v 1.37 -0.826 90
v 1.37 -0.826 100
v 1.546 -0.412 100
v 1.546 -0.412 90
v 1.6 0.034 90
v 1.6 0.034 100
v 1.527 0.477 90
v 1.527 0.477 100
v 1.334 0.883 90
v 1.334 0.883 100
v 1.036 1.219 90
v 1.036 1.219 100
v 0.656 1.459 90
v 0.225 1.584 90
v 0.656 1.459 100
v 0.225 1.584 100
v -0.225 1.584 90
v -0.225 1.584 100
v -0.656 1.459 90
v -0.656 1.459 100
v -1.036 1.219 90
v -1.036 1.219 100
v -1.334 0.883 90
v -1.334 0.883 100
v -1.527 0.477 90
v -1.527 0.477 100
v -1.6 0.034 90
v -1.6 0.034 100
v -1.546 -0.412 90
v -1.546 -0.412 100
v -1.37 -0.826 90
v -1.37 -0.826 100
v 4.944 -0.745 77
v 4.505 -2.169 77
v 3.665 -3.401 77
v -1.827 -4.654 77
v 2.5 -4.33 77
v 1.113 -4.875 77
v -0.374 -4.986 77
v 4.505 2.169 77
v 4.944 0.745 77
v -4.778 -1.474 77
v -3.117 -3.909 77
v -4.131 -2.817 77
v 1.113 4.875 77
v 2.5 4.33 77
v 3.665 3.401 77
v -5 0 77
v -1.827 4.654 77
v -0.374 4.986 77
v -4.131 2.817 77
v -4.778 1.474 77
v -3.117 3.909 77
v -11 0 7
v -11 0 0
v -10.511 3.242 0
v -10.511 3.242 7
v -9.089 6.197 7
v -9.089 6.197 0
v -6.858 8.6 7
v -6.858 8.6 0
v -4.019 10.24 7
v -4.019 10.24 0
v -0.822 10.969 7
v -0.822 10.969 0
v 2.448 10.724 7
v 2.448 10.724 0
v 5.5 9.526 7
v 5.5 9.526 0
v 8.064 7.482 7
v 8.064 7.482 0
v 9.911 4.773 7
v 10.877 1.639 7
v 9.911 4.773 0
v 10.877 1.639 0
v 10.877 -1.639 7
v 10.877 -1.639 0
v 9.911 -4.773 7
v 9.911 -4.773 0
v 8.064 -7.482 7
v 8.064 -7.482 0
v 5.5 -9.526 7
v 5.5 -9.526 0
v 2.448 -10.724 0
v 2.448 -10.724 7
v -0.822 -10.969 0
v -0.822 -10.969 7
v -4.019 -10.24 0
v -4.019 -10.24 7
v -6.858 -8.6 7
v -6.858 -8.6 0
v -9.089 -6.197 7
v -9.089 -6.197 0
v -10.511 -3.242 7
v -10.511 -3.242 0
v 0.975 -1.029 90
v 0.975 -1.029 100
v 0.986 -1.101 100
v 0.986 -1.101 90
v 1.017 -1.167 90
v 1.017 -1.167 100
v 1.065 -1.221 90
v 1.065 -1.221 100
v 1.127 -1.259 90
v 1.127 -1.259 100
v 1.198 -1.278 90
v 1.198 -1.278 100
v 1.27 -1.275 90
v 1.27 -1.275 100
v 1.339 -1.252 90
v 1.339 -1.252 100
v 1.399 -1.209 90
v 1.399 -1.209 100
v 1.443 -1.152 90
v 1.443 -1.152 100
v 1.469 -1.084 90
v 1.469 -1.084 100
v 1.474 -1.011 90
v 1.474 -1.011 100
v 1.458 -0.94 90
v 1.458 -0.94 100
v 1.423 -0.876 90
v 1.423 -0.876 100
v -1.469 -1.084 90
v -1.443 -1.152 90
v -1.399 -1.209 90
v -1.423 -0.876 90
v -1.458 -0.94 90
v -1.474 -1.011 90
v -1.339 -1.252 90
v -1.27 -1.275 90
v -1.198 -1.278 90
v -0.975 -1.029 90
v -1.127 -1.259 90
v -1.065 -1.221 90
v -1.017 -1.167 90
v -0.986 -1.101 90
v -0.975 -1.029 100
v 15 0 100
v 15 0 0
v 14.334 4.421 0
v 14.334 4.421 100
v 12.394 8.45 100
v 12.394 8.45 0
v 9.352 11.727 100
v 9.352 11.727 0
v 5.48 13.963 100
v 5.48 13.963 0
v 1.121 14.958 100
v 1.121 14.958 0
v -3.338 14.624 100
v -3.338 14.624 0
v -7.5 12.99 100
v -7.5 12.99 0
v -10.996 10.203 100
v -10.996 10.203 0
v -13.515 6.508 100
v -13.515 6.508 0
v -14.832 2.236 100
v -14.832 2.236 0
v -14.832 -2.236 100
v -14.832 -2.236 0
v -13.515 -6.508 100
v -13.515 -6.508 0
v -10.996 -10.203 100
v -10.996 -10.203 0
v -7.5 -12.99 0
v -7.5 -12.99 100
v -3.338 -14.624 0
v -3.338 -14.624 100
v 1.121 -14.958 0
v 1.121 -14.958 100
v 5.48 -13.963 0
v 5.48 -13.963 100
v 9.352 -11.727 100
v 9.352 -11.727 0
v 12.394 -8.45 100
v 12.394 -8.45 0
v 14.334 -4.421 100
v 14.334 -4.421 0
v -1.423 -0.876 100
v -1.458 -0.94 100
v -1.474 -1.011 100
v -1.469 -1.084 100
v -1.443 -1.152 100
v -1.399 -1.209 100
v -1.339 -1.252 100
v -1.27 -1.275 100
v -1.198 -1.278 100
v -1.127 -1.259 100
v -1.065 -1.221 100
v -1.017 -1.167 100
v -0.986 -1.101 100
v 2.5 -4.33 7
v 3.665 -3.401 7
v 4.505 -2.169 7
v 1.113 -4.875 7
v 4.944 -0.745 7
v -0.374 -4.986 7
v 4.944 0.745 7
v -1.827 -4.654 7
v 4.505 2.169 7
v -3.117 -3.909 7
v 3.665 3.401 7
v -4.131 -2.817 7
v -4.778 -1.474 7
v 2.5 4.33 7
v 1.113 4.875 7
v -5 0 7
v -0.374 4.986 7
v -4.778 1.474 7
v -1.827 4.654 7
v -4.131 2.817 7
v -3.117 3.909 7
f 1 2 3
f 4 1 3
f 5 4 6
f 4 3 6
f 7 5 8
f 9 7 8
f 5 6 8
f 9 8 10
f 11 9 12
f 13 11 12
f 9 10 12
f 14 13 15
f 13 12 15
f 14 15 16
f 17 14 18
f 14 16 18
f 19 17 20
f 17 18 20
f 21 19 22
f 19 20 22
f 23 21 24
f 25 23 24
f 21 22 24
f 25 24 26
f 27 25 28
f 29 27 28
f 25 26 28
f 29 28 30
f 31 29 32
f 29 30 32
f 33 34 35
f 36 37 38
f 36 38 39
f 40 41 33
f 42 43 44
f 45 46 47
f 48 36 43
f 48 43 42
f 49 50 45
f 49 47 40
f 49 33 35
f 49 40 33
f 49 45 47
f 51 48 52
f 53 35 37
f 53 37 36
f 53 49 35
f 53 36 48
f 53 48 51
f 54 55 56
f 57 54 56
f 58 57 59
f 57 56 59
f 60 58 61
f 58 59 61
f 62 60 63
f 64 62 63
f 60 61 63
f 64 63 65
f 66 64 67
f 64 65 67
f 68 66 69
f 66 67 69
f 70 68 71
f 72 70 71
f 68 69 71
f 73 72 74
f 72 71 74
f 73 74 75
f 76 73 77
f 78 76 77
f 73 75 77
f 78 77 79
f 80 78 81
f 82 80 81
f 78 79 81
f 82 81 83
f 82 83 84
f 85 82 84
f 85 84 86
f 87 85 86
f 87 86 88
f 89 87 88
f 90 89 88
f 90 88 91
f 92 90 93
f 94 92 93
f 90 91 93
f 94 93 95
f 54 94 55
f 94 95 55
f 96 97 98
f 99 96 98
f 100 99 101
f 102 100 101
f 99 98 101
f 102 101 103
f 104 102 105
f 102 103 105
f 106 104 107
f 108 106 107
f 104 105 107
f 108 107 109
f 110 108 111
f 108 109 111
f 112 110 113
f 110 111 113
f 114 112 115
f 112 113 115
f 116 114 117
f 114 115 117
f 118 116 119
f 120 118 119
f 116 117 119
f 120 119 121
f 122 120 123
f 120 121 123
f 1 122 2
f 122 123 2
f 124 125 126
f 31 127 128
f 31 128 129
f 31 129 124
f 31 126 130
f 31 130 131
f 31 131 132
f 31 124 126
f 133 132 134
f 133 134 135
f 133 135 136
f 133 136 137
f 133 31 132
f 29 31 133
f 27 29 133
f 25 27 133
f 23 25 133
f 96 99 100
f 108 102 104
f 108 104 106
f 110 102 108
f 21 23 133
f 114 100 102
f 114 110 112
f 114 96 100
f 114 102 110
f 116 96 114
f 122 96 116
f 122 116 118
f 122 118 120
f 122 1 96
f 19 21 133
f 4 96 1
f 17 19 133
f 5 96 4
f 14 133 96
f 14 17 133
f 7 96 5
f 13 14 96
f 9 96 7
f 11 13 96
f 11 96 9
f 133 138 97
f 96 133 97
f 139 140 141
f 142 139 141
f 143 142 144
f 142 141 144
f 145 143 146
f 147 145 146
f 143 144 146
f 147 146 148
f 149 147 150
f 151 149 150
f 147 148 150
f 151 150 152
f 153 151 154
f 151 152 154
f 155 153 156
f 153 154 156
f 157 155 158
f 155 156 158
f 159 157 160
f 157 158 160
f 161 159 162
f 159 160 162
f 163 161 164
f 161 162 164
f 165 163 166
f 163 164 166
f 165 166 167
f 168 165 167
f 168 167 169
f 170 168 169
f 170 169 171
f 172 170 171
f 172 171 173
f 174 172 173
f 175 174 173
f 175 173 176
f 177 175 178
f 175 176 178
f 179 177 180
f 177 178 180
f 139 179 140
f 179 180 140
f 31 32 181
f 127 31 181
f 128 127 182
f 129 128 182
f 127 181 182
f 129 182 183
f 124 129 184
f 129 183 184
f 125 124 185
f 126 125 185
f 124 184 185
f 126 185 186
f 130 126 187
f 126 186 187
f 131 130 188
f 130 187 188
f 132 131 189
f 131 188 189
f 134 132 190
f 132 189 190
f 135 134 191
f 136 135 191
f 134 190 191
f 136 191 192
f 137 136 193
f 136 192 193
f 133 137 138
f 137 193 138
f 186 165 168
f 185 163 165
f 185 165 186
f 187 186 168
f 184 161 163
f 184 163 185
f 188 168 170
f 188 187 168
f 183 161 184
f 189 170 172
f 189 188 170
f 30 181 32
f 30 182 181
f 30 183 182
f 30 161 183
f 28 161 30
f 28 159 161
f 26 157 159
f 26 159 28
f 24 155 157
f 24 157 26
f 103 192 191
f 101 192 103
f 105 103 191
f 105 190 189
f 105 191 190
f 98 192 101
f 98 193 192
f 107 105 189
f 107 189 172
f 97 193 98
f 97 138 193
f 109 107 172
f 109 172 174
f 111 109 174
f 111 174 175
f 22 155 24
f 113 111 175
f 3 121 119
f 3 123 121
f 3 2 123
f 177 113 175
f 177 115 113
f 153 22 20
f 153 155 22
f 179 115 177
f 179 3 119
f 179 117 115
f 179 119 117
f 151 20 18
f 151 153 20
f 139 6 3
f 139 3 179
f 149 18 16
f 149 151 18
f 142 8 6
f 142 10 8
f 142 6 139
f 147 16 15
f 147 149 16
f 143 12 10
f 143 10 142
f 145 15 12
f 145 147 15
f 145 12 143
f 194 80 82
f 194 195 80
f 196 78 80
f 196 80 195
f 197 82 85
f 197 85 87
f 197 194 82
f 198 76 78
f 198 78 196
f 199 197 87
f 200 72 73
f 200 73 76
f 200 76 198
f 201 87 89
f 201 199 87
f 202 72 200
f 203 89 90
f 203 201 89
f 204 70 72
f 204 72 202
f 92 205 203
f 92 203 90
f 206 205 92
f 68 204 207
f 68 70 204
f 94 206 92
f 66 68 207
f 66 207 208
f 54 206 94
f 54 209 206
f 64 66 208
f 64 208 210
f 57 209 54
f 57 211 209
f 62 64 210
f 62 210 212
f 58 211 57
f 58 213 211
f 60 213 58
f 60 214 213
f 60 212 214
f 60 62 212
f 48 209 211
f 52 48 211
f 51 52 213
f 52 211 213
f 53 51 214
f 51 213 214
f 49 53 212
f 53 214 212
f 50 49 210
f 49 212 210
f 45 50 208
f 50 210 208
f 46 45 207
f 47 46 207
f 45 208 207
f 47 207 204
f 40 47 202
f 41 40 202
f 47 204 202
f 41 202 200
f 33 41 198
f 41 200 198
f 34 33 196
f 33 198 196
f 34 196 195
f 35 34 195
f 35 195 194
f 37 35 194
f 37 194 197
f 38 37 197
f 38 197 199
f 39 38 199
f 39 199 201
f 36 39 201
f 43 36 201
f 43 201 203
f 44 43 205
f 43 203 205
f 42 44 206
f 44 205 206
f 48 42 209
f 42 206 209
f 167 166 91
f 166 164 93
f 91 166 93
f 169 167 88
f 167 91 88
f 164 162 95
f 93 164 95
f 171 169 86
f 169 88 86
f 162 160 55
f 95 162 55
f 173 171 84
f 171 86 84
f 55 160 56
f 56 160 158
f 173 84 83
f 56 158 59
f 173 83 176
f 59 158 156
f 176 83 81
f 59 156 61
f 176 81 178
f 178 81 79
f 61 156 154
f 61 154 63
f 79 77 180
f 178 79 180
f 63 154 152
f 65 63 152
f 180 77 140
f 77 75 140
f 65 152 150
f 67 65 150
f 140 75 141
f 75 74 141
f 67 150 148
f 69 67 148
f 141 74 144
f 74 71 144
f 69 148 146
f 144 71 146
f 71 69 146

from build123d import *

# Parameters (mm, degrees)
SKETCH1_R           = 15
BOSS_EXTRUDE1_DEPTH = 100
CUT_EXTRUDE1_DEPTH  = 10
SKETCH3_R           = 11
CUT_EXTRUDE2_DEPTH  = 7
SKETCH4_R           = 5
CUT_EXTRUDE3_DEPTH  = 70


with BuildPart() as part:
    # Sketch1 → Boss-Extrude1 (new body)
    with BuildSketch(Plane.XY):
        Circle(SKETCH1_R)
    extrude(amount=BOSS_EXTRUDE1_DEPTH)

    # Sketch2 → Cut-Extrude1 (cut)
    with BuildSketch(Plane.XY.offset(100)):
        with BuildLine():
            Line((-0.975, -1.029259443), (0.975, -1.029259443))
            ThreePointArc((0.975, -1.029259443), (1.339358737, -1.251570214), (1.370376634, -0.82587401))
            ThreePointArc((1.370376634, -0.82587401), (0, 1.6), (-1.370376634, -0.82587401))
            ThreePointArc((-1.370376634, -0.82587401), (-1.339358737, -1.251570214), (-0.975, -1.029259443))
        make_face()
    extrude(amount=-CUT_EXTRUDE1_DEPTH, mode=Mode.SUBTRACT)

    # Sketch3 → Cut-Extrude2 (cut)
    with BuildSketch(Plane(origin=(0, 0, 0), x_dir=(-1, 0, 0), z_dir=(0, 0, -1))):
        Circle(SKETCH3_R)
    extrude(amount=-CUT_EXTRUDE2_DEPTH, mode=Mode.SUBTRACT)

    # Sketch4 → Cut-Extrude3 (cut)
    with BuildSketch(Plane(origin=(0, 0, 7), x_dir=(-1, 0, 0), z_dir=(0, 0, -1))):
        Circle(SKETCH4_R)
    extrude(amount=-CUT_EXTRUDE3_DEPTH, mode=Mode.SUBTRACT)


solid = part.part
